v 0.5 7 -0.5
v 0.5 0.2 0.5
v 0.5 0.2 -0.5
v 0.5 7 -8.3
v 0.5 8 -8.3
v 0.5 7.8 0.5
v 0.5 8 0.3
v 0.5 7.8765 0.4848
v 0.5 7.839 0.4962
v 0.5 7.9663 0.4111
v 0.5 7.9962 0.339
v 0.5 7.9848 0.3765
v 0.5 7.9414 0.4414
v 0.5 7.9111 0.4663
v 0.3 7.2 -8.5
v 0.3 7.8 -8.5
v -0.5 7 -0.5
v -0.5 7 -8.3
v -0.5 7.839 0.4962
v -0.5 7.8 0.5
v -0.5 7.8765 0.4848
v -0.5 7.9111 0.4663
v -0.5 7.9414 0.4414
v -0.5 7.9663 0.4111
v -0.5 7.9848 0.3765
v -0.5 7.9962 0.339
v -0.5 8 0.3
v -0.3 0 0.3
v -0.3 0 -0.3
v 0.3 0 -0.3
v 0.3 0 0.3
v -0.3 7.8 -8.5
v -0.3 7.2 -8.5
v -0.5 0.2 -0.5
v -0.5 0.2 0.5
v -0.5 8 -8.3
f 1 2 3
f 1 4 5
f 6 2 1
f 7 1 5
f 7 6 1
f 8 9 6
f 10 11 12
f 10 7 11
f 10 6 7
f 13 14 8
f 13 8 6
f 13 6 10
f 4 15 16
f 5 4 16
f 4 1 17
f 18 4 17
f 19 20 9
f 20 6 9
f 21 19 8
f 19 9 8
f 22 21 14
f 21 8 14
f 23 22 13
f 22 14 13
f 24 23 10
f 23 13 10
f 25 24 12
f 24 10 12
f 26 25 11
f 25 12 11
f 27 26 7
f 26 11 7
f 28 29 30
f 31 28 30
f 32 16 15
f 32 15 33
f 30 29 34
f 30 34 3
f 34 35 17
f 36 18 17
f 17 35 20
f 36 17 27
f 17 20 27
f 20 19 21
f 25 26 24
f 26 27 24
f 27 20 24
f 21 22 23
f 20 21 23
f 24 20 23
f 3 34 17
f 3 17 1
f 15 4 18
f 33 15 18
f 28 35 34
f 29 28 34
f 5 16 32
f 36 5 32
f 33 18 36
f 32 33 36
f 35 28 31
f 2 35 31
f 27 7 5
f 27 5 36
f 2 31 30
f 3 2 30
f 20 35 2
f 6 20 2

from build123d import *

# Parameters (mm, degrees)
SKETCH2_W           = 1
SKETCH2_H           = 1
BOSS_EXTRUDE1_DEPTH = 8
SKETCH3_W           = 1
SKETCH3_H           = 1
BOSS_EXTRUDE2_DEPTH = 8
FILLET1_R           = 0.2
CHAMFER1_SIZE       = 0.2
CHAMFER2_SIZE       = 0.2


with BuildPart() as part:
    # Sketch2 → Boss-Extrude1 (new body)
    with BuildSketch(Plane(origin=(0, 0, 0), x_dir=(1, 0, 0), z_dir=(0, 1, 0))):
        Rectangle(SKETCH2_W, SKETCH2_H)
    extrude(amount=BOSS_EXTRUDE1_DEPTH)

    # Sketch3 → Boss-Extrude2 (add)
    with BuildSketch(Plane(origin=(0, 0, -0.5), x_dir=(-1, 0, 0), z_dir=(0, 0, -1))):
        with Locations((0, 7.5)):
            Rectangle(SKETCH3_W, SKETCH3_H)
    extrude(amount=BOSS_EXTRUDE2_DEPTH)

    # Fillet1
    fillet1_edges = [part.edges().sort_by_distance(p)[0] for p in [
        (0, 8, 0.5),
    ]]
    fillet(fillet1_edges, radius=FILLET1_R)

    # Chamfer1
    chamfer1_edges = [part.edges().sort_by_distance(p)[0] for p in [
        (0.5, 7.5, -8.5),
        (0, 7, -8.5),
        (-0.5, 7.5, -8.5),
        (0, 8, -8.5),
    ]]
    chamfer(chamfer1_edges, length=CHAMFER1_SIZE)

    # Chamfer2
    chamfer2_edges = [part.edges().sort_by_distance(p)[0] for p in [
        (-0.5, 0, 0),
        (0, 0, -0.5),
        (0.5, 0, 0),
        (0, 0, 0.5),
    ]]
    chamfer(chamfer2_edges, length=CHAMFER2_SIZE)


solid = part.part
